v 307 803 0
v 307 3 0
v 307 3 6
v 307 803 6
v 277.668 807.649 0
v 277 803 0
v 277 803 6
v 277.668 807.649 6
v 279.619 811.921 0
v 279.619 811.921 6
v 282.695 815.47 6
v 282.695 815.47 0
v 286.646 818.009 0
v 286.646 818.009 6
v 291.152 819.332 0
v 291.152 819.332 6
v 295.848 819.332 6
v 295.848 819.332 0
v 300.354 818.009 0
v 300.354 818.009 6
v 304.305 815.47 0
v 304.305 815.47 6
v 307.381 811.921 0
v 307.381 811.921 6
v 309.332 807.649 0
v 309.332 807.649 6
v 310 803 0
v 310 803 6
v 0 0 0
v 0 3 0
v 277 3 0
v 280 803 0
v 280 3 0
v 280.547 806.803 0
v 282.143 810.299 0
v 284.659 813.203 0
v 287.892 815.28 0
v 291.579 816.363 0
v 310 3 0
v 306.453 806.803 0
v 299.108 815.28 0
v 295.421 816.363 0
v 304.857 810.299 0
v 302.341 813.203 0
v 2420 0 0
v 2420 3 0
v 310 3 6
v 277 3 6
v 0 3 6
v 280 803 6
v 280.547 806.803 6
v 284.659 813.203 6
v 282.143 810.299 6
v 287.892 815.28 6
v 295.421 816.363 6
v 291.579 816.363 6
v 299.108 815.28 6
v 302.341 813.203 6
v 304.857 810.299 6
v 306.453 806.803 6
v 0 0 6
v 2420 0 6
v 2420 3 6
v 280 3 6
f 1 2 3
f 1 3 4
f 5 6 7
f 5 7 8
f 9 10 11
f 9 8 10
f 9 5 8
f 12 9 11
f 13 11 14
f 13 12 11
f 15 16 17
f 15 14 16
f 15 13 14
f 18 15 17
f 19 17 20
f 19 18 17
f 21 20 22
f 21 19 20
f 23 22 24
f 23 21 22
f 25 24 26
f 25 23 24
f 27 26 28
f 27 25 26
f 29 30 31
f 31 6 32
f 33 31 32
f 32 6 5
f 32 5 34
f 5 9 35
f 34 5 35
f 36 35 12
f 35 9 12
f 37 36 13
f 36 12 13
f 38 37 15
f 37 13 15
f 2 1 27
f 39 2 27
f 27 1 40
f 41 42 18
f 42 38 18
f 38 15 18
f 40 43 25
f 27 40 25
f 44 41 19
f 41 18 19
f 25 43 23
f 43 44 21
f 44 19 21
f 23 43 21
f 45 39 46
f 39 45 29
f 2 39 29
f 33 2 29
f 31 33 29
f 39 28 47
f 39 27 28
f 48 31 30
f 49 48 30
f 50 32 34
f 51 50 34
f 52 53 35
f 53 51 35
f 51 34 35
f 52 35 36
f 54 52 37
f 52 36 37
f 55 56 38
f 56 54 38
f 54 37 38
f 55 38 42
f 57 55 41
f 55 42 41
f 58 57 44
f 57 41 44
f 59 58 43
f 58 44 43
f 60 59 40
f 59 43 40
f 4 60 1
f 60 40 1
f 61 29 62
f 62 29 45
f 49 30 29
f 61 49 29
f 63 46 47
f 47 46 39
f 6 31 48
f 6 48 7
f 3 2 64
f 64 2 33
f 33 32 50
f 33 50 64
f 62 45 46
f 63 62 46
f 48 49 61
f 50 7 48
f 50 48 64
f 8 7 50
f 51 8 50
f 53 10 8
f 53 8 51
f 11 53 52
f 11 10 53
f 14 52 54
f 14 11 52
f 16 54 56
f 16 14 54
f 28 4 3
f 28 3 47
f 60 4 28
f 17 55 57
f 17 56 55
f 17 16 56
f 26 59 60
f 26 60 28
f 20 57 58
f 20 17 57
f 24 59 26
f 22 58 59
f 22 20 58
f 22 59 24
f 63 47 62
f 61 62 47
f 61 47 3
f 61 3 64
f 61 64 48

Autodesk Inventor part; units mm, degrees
ref_plane "YZ Plane" through (0, 0, 0) normal (1, 0, 0) x (0, 1, 0)
ref_plane "XZ Plane" through (0, 0, 0) normal (0, 1, 0) x (-1, 0, 0)
ref_plane "XY Plane" through (0, 0, 0) normal (0, 0, 1) x (1, 0, 0)
sketch "Sketch2" plane through (0, 0, 0) normal (0, 0, 1) x (1, 0, 0)
  line L0 (0, 0) -> (2420, 0)
  line L1 (2420, 0) -> (2420, 3)
  line L2 (2420, 3) -> (0, 3)
  line L3 (0, 3) -> (0, 0)
  line L4 (307, 3) -> (307, 803)
  line L5 (307, 803) -> (310, 803)
  line L6 (310, 803) -> (310, 3)
  line L7 (310, 803) -> (1110, 803) construction
  line L8 (277, 3) -> (277, 803)
  line L9 (277, 803) -> (280, 803)
  line L10 (280, 803) -> (280, 3)
  line L11 (310, 806) -> (310, 803)
  line L12 (310, 3) -> (307, 3)
  line L13 (277, 3) -> (280, 3)
  line L14 (277, 3) -> (280, 3)
  arc A0 (310, 803) -> (277, 803) centre (293.5, 803) ccw
  arc A1 (307, 803) -> (280, 803) centre (293.5, 803) ccw
  line L15 (277, 803) -> (280, 803)
  line L16 (307, 803) -> (310, 803)
  dimension "d16" = 2420
  dimension "d17" = 3
  dimension "d18" = 90
  dimension "d21" = 800
  dimension "d22" = 3
  dimension "d23" = 90
  dimension "d24" = 90
  dimension "d25" = 2110
  dimension "d28" = 30
extrude "Extrusion2" add sketch "Sketch2" along normal blind 6 contours L3 L2 L1 L0 | L8 L9 L10 L2 | L2 L4 L5 L6 | A0 L5 A1 L9
properties part number "BeltMain" material "Rubber"
